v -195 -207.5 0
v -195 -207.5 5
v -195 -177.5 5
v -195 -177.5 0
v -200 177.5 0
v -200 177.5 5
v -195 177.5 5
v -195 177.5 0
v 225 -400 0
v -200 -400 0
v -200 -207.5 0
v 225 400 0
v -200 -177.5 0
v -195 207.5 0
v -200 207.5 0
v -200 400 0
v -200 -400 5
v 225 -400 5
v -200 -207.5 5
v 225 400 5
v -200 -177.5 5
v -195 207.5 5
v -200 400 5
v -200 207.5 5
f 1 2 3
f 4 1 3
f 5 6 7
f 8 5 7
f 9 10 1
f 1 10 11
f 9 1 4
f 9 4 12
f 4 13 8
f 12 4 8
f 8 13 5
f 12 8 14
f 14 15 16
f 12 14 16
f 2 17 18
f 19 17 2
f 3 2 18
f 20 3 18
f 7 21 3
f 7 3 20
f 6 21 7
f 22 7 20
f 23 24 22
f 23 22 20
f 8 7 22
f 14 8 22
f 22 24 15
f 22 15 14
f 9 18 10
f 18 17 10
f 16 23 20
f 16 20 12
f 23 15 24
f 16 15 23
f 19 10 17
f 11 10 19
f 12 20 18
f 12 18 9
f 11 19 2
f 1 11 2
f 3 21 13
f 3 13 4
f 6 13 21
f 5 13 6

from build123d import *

# Parameters (mm, degrees)
ESQUISSE1_W             = 400
ESQUISSE1_H             = 800
BOSS_EXTRU_1_DEPTH      = 5
ESQUISSE2_W             = 5
ESQUISSE2_H             = 30
ENL_V_MAT_EXTRU_1_DEPTH = 5
ESQUISSE3_W             = 5
ESQUISSE3_H             = 800
BOSS_EXTRU_2_DEPTH      = 25


with BuildPart() as part:
    # Esquisse1 → Boss.-Extru.1 (new body)
    with BuildSketch(Plane.XY):
        Rectangle(ESQUISSE1_W, ESQUISSE1_H)
    extrude(amount=BOSS_EXTRU_1_DEPTH)

    # Esquisse2 → Enlèv. mat.-Extru.1 (cut)
    with BuildSketch(Plane.XY.offset(5)):
        with Locations((-197.5, 192.5)):
            Rectangle(ESQUISSE2_W, ESQUISSE2_H)
        with Locations((-197.5, -192.5)):
            Rectangle(ESQUISSE2_W, ESQUISSE2_H)
    extrude(amount=-ENL_V_MAT_EXTRU_1_DEPTH, mode=Mode.SUBTRACT)

    # Esquisse3 → Boss.-Extru.2 (add)
    with BuildSketch(Plane(origin=(200, 0, 0), x_dir=(0, 0, -1), z_dir=(1, 0, 0))):
        with Locations((-2.5, 0)):
            Rectangle(ESQUISSE3_W, ESQUISSE3_H)
    extrude(amount=BOSS_EXTRU_2_DEPTH)


solid = part.part
